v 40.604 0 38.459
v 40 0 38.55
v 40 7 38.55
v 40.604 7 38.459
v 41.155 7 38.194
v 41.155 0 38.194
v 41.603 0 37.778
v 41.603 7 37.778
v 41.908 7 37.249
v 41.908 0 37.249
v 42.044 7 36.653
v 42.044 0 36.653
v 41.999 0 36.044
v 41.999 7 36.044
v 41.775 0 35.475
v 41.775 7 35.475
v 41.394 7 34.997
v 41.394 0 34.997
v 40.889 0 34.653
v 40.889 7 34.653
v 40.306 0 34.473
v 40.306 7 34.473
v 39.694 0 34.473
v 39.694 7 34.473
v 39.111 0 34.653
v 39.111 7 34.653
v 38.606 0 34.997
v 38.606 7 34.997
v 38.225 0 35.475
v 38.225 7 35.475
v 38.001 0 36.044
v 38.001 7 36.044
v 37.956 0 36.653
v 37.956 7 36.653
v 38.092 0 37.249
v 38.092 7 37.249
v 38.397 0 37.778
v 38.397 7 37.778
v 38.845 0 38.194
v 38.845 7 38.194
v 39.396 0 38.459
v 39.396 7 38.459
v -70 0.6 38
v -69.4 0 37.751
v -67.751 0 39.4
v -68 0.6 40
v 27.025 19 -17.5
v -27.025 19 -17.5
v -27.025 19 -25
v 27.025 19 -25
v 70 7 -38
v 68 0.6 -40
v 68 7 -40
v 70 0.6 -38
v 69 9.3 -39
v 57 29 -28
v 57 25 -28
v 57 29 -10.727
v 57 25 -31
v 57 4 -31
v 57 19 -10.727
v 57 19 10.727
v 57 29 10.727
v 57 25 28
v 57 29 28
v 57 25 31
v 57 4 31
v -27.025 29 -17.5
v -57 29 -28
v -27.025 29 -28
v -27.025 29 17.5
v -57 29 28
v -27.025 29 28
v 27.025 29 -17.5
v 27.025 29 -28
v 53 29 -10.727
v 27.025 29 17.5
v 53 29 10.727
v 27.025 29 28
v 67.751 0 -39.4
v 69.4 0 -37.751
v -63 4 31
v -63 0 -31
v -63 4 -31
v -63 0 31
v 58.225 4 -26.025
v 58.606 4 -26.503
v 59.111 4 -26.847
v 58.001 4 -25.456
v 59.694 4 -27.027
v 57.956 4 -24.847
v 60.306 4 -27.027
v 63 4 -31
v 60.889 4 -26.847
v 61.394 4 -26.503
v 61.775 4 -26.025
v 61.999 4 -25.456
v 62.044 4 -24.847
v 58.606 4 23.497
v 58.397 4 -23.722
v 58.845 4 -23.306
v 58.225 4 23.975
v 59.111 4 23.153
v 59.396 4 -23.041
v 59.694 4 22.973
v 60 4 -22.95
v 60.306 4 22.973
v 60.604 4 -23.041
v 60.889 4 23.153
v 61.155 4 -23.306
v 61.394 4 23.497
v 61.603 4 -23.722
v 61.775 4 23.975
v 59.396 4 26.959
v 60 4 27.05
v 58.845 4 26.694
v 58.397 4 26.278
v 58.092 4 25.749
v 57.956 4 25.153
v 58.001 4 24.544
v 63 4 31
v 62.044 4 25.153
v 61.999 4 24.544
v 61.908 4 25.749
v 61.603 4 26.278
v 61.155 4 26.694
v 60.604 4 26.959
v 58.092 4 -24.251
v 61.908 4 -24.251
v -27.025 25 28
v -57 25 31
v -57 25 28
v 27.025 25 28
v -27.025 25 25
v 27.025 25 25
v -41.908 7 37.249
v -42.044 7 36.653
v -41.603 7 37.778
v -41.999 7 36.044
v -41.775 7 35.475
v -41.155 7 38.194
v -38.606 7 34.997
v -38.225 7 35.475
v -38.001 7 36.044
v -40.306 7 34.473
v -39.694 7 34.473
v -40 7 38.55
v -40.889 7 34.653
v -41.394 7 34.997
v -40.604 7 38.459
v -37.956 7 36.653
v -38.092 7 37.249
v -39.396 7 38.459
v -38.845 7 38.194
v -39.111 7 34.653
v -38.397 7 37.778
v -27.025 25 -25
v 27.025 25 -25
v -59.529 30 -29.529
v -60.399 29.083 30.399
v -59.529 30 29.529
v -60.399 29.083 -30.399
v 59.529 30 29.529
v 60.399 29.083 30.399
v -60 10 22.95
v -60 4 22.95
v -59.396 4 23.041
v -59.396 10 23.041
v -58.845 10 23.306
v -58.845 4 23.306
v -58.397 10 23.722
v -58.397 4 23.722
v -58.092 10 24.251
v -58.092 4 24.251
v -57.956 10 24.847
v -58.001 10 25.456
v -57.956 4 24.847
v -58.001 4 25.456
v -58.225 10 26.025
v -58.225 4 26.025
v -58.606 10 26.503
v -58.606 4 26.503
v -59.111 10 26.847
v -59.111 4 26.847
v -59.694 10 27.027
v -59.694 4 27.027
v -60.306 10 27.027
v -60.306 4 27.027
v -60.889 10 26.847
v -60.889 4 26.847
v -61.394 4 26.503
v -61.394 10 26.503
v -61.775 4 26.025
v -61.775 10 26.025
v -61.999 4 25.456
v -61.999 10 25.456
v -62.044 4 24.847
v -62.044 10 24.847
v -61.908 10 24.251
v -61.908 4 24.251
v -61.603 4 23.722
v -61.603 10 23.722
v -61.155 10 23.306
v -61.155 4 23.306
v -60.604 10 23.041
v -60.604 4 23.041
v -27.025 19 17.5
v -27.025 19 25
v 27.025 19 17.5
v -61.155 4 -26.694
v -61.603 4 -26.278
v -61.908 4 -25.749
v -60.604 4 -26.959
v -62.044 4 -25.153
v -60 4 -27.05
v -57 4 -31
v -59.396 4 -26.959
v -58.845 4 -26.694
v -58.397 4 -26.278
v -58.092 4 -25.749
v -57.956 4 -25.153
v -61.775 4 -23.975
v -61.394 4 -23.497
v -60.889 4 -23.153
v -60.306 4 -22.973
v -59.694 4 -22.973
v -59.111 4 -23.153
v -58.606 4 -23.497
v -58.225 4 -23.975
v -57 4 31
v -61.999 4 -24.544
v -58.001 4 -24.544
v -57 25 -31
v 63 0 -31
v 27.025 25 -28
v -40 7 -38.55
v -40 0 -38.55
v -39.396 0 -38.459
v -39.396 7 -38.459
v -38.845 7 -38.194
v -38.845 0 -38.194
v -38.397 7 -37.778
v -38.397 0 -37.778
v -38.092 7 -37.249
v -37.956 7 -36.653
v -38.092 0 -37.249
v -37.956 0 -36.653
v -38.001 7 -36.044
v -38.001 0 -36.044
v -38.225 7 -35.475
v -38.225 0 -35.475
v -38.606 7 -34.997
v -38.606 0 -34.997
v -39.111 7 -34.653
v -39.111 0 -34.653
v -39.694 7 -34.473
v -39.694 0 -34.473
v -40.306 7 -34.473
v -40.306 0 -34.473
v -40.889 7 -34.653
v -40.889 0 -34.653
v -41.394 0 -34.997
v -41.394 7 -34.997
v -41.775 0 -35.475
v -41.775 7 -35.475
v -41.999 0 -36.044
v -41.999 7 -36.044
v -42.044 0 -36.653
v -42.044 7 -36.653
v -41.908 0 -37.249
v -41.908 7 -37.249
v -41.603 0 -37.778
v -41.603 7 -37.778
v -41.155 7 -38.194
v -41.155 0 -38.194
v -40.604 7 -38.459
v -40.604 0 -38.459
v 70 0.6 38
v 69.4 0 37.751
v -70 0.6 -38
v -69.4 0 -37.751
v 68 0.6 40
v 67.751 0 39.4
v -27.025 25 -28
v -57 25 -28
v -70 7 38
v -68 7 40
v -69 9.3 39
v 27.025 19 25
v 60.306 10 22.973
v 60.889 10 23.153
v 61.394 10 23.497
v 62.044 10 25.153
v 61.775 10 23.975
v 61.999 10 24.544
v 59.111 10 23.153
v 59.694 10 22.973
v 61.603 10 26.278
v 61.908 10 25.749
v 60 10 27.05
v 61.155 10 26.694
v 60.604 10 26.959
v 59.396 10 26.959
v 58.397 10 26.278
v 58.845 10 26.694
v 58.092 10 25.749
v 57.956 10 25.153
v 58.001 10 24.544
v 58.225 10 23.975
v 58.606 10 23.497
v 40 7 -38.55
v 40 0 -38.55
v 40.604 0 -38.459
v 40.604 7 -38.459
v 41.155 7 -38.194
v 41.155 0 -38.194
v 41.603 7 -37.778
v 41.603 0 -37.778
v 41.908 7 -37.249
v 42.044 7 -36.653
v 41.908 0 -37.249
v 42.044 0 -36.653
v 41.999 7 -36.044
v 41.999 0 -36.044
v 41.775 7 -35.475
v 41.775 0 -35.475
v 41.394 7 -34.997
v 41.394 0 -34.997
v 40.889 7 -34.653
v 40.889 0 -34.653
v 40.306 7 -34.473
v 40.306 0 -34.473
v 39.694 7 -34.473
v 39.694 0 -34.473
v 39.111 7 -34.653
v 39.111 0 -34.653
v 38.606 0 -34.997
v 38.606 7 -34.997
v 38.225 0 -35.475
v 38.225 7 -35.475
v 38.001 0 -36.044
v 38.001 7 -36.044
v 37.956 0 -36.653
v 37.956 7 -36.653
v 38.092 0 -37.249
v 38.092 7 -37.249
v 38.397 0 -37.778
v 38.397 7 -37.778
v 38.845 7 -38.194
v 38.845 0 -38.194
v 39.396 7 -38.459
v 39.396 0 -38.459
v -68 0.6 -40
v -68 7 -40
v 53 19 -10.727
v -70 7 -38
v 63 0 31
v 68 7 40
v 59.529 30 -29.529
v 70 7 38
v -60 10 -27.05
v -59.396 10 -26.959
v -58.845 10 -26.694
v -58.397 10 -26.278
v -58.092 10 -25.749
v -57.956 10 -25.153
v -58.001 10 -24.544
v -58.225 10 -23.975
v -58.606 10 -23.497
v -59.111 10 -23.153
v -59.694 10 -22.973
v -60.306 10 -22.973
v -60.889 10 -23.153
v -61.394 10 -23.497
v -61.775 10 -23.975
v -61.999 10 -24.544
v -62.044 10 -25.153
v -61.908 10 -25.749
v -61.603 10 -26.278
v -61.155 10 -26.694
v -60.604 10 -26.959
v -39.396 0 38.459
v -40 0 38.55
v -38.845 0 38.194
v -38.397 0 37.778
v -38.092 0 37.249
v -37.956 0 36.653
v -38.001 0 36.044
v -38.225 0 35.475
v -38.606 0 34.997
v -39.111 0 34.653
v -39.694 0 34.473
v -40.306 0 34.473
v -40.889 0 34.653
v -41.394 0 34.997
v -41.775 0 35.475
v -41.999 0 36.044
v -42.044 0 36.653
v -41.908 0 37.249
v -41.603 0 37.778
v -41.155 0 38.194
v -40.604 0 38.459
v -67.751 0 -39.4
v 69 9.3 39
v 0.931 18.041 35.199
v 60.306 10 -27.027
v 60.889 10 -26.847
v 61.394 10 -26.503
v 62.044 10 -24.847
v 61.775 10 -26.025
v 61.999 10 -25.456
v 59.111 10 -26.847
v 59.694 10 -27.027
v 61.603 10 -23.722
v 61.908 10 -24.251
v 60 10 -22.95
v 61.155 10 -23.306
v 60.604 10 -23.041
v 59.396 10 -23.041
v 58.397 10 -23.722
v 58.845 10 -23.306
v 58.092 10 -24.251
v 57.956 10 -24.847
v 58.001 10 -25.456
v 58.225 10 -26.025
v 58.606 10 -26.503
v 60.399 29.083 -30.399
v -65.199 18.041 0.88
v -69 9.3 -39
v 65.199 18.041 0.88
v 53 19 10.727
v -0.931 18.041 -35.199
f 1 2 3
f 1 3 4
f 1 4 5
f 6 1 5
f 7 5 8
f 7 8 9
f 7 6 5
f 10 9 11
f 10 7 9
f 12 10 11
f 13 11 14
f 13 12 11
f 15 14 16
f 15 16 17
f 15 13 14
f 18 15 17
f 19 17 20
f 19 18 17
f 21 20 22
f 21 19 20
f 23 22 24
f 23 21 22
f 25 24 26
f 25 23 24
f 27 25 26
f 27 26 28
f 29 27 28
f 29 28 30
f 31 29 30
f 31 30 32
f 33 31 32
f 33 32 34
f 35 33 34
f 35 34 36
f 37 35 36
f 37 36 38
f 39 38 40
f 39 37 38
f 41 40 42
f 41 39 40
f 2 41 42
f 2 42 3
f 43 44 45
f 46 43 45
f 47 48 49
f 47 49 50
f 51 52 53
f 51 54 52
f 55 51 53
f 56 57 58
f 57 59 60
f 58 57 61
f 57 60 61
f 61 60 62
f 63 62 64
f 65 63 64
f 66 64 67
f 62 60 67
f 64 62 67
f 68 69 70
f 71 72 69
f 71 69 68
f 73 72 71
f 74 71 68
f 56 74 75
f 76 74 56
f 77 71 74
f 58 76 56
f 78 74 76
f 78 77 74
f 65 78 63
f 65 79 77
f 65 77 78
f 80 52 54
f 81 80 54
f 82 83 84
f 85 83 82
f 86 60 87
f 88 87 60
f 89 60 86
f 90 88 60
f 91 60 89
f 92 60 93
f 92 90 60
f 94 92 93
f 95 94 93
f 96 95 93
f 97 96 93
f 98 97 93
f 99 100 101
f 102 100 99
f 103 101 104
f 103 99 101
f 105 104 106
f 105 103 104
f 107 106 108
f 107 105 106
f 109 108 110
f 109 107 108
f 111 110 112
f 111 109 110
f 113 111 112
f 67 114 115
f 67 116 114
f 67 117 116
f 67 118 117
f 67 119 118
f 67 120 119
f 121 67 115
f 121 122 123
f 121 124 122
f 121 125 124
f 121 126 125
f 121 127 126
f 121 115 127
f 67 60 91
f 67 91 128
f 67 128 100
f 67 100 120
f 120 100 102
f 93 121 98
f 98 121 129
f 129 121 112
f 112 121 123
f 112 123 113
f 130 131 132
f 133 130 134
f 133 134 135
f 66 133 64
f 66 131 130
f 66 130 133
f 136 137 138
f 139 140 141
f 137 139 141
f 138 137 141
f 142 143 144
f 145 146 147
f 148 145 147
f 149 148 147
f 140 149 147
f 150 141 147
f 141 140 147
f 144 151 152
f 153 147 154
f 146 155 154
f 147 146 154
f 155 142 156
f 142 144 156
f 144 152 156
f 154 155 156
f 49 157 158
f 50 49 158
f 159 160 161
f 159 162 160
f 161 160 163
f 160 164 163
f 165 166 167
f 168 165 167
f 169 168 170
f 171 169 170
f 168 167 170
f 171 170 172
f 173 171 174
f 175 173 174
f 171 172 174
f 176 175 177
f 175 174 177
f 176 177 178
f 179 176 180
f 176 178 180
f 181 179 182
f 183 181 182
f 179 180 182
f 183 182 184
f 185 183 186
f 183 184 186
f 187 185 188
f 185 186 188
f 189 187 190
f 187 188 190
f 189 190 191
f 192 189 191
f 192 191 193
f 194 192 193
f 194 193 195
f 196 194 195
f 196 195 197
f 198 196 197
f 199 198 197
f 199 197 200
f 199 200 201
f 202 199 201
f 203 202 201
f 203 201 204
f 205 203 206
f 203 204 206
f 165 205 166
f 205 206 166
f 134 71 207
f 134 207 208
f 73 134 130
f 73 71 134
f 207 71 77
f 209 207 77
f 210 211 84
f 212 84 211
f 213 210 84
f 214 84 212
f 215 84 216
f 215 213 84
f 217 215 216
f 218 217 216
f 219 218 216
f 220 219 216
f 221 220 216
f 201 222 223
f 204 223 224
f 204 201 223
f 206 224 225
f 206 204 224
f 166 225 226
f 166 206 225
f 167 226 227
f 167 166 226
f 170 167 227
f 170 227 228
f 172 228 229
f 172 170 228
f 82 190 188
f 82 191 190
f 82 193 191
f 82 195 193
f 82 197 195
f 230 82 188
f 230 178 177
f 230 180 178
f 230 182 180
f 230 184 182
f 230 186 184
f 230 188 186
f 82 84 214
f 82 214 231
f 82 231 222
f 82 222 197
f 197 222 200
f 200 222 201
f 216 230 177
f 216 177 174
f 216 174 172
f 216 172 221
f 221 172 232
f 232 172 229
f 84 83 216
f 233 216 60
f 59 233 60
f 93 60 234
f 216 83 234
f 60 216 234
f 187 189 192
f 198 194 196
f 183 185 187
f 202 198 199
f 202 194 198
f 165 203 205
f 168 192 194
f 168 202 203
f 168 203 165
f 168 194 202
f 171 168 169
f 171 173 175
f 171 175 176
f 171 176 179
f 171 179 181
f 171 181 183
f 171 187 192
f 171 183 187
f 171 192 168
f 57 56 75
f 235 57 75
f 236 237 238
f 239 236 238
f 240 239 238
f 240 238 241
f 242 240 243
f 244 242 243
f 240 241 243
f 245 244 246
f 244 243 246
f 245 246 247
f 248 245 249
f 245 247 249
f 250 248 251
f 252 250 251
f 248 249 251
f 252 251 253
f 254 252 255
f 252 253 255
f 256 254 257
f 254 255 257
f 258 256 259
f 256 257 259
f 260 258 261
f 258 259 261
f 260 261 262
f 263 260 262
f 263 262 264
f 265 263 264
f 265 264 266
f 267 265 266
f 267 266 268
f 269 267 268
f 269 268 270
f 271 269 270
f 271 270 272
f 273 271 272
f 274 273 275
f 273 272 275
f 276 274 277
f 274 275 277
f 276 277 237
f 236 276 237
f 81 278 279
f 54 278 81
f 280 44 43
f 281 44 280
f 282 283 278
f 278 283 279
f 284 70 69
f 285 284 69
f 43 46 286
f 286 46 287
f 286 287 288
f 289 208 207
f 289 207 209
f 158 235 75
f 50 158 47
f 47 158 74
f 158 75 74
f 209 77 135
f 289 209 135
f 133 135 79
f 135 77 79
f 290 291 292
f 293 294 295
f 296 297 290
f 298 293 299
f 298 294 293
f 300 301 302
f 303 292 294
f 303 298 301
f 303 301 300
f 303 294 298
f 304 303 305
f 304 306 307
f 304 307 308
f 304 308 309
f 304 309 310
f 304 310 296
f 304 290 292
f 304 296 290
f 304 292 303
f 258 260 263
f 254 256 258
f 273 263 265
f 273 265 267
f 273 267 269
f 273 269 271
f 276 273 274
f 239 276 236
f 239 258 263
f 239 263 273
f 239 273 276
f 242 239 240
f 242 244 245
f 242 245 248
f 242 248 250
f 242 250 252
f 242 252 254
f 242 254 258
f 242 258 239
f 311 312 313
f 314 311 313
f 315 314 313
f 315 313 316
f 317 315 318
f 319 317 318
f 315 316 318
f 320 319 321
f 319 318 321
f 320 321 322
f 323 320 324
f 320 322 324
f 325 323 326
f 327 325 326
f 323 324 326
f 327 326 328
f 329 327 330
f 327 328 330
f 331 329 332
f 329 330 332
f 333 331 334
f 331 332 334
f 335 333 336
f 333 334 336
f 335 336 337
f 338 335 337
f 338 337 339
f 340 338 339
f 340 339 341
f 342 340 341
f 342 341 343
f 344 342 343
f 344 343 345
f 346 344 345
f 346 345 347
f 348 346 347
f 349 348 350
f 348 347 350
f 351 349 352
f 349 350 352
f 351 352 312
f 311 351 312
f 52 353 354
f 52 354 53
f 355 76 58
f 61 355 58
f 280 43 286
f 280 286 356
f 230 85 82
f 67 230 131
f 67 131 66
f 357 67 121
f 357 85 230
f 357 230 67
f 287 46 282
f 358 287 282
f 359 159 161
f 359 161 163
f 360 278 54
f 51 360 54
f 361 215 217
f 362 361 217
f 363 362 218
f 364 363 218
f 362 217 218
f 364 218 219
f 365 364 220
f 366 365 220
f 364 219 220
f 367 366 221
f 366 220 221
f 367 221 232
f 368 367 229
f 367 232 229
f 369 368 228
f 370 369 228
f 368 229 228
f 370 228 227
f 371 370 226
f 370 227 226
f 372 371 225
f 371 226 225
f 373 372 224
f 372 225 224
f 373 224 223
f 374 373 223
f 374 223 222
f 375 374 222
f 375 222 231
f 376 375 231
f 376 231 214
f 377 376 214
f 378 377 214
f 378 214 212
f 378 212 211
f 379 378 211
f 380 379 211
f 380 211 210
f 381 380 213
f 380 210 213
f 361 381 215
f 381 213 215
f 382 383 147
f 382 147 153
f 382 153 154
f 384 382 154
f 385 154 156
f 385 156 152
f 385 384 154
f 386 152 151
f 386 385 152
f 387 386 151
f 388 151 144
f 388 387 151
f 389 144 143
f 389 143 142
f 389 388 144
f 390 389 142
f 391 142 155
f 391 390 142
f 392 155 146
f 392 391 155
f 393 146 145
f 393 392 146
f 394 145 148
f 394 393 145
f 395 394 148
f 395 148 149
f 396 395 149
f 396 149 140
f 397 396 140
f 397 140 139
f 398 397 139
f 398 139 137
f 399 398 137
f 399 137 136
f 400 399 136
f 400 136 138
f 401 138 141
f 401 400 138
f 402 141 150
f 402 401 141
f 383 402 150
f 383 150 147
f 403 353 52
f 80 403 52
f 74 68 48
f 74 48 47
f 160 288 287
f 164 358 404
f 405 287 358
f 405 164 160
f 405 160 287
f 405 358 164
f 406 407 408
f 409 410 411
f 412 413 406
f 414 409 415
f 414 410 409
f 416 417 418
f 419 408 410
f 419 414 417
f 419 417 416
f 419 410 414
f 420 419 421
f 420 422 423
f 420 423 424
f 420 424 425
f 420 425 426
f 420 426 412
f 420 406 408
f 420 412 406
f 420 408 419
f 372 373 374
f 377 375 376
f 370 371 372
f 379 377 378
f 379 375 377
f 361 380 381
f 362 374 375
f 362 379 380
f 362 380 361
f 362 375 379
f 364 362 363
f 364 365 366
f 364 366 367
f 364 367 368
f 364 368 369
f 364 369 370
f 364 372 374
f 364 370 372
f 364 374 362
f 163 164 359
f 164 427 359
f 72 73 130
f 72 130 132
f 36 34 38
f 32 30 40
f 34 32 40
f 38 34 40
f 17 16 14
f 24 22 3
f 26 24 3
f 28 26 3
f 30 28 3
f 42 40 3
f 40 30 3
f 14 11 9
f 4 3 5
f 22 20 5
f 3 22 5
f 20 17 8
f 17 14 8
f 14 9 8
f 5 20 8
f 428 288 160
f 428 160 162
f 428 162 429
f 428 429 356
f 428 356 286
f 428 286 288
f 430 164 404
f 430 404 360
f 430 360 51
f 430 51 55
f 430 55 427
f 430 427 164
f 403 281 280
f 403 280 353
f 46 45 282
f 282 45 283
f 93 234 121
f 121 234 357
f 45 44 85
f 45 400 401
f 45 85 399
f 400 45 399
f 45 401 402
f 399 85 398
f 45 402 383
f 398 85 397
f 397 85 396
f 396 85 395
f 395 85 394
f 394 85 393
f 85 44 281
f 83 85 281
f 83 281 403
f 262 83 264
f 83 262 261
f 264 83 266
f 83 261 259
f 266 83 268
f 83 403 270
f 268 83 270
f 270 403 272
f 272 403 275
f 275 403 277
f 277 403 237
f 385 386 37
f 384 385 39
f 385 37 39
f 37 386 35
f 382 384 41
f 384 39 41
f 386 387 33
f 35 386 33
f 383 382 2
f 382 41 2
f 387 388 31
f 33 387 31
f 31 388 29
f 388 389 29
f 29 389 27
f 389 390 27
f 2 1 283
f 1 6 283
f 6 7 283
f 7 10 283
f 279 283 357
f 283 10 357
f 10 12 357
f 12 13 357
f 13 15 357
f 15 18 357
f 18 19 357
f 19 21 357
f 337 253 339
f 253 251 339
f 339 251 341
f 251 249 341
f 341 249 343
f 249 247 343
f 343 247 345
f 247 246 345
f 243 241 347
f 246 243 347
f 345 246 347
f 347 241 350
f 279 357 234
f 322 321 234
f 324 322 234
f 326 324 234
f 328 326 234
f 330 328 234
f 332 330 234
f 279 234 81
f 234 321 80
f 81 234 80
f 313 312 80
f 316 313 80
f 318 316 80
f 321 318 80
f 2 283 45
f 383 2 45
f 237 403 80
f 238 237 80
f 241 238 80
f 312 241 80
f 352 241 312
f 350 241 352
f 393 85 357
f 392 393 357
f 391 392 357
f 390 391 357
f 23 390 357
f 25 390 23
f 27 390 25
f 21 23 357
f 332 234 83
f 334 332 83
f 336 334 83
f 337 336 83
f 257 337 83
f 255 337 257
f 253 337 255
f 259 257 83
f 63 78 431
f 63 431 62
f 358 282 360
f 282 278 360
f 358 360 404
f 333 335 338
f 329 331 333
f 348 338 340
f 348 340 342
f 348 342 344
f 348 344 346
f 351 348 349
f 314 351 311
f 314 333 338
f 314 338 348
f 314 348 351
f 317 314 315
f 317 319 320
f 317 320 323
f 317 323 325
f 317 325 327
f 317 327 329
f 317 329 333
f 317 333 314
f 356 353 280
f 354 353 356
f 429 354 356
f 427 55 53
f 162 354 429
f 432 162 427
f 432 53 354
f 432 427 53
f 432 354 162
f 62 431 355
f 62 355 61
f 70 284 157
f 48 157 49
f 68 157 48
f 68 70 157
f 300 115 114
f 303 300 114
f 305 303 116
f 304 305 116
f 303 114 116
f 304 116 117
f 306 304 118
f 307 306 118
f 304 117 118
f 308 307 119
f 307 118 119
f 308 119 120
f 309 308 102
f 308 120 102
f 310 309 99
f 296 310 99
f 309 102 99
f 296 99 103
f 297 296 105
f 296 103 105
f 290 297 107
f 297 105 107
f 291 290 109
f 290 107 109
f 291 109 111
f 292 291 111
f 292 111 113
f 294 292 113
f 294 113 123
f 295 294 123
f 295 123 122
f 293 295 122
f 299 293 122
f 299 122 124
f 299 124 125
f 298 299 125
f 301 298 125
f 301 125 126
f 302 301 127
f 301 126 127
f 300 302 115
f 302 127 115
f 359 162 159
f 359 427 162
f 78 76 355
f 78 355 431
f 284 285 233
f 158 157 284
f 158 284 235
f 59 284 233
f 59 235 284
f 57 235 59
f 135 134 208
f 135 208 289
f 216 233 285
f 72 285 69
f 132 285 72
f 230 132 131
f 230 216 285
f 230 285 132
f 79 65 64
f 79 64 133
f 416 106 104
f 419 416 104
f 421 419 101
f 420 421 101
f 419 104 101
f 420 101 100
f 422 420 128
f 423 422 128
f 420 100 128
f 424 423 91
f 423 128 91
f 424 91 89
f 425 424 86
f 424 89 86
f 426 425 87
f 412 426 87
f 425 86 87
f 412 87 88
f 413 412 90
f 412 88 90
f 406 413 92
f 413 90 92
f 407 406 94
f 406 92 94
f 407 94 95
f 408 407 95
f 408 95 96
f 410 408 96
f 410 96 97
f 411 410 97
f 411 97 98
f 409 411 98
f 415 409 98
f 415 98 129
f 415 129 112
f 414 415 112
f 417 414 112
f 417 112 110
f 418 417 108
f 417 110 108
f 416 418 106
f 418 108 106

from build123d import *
from OCP.BRepFilletAPI import BRepFilletAPI_MakeChamfer

# Parameters (mm, degrees)
SKETCH1_W                       = 140
SKETCH1_H                       = 80
BOSS_EXTRUDE1_DEPTH             = 7
SKETCH3_W                       = 140
SKETCH3_H                       = 80
SKETCH2_W                       = 120
SKETCH2_H                       = 60
CHAMFER1_SIZE                   = 2
SKETCH4_R                       = 2.05
CUT_EXTRUDE1_DEPTH              = 7
SKETCH5_W                       = 114
SKETCH5_H                       = 50
CUT_EXTRUDE2_DEPTH              = 29
SKETCH6_W                       = 114
SKETCH6_H                       = 62
CUT_EXTRUDE3_DEPTH              = 25
SKETCH7_W                       = 6
SKETCH7_H                       = 62
CUT_EXTRUDE4_DEPTH              = 4
SKETCH8_R                       = 2.05
CUT_EXTRUDE5_DEPTH              = 6
CHAMFER2_SIZE                   = 1
CHAMFER2_SIZE2                  = 0.471497246
CHAMFER3_SIZE                   = 0.6
SKIZZE1_W                       = 54.050484576
SKIZZE1_H                       = 7.5
SKIZZE1_W_2                     = 4
SKIZZE1_H_2                     = 21.453027382
AUFSATZ_LINEAR_AUSTRAGEN1_DEPTH = 10
SKIZZE3_W                       = 29.974757712
SKIZZE3_H                       = 3
SCHNITT_LINEAR_AUSTRAGEN2_DEPTH = 4


with BuildPart() as part:
    # Sketch1 → Boss-Extrude1 (new body)
    with BuildSketch(Plane(origin=(0, 0, 0), x_dir=(1, 0, 0), z_dir=(0, 1, 0))):
        Rectangle(SKETCH1_W, SKETCH1_H)
    extrude(amount=BOSS_EXTRUDE1_DEPTH)

    # Sketch3 → Loft2 section 0
    with BuildSketch(Plane(origin=(0, 7, 0), x_dir=(1, 0, 0), z_dir=(0, 1, 0))):
        Rectangle(SKETCH3_W, SKETCH3_H)
    # Sketch2 → Loft2 section 1
    with BuildSketch(Plane(origin=(0, 30, 0), x_dir=(1, 0, 0), z_dir=(0, 1, 0))):
        Rectangle(SKETCH2_W, SKETCH2_H)
    loft()

    # Chamfer1
    chamfer1_edges = [part.edges().sort_by_distance(p)[0] for p in [
        (-70, 3.5, 40),
        (70, 3.5, 40),
        (70, 3.5, -40),
        (-70, 3.5, -40),
    ]]
    chamfer(chamfer1_edges, length=CHAMFER1_SIZE)

    # Sketch4 → Cut-Extrude1 (cut)
    with BuildSketch(Plane.XZ):
        with Locations(Location((40, -36.5, 0), (0, 0, 270))):
            Circle(SKETCH4_R)
        with Locations(Location((-40, -36.5, 0), (0, 0, 270))):
            Circle(SKETCH4_R)
    cut_extrude1 = extrude(amount=-CUT_EXTRUDE1_DEPTH, mode=Mode.SUBTRACT)

    # Sketch5 → Cut-Extrude2 (cut)
    with BuildSketch(Plane.XZ):
        Rectangle(SKETCH5_W, SKETCH5_H)
    extrude(amount=-CUT_EXTRUDE2_DEPTH, mode=Mode.SUBTRACT)

    # Mirror1: Cut-Extrude1 across plane
    add(cut_extrude1.mirror(Plane.XY), mode=Mode.SUBTRACT)

    # Sketch6 → Cut-Extrude3 (cut)
    with BuildSketch(Plane.XZ):
        Rectangle(SKETCH6_W, SKETCH6_H)
    extrude(amount=-CUT_EXTRUDE3_DEPTH, mode=Mode.SUBTRACT)

    # Sketch7 → Cut-Extrude4 (cut)
    with BuildSketch(Plane.XZ):
        with Locations((-60, 0)):
            Rectangle(SKETCH7_W, SKETCH7_H)
        with Locations((60, 0)):
            Rectangle(SKETCH7_W, SKETCH7_H)
    extrude(amount=-CUT_EXTRUDE4_DEPTH, mode=Mode.SUBTRACT)

    # Sketch8 → Cut-Extrude5 (cut)
    with BuildSketch(Plane.XZ.offset(-4)):
        with Locations(Location((-60, 25, 0), (0, 0, 270))):
            Circle(SKETCH8_R)
        with Locations(Location((-60, -25, 0), (0, 0, 270))):
            Circle(SKETCH8_R)
        with Locations(Location((60, -25, 0), (0, 0, 90))):
            Circle(SKETCH8_R)
        with Locations(Location((60, 25, 0), (0, 0, 90))):
            Circle(SKETCH8_R)
    extrude(amount=-CUT_EXTRUDE5_DEPTH, mode=Mode.SUBTRACT)

    # Chamfer2: one chamfer whose edges measure the first distance from different faces: ONE call of the kernel's chamfer builder (chamfer() names one face for all edges)
    chamfer2_edges_1 = [part.edges().sort_by_distance(p)[0] for p in [
        (60, 30, 0),
    ]]
    chamfer2_side_1 = [part.faces().sort_by_distance(p)[0] for p in [
        (65.225405922, 17.98156638, 0),
    ]]
    chamfer2_edges_2 = [part.edges().sort_by_distance(p)[0] for p in [
        (0, 30, -30),
    ]]
    chamfer2_side_2 = [part.faces().sort_by_distance(p)[0] for p in [
        (0, 18.221212121, -35.121212121),
    ]]
    chamfer2_edges_3 = [part.edges().sort_by_distance(p)[0] for p in [
        (-60, 30, 0),
    ]]
    chamfer2_side_3 = [part.faces().sort_by_distance(p)[0] for p in [
        (-65.225405922, 17.98156638, 0),
    ]]
    chamfer2_edges_4 = [part.edges().sort_by_distance(p)[0] for p in [
        (0, 30, 30),
    ]]
    chamfer2_side_4 = [part.faces().sort_by_distance(p)[0] for p in [
        (0, 18.221212121, 35.121212121),
    ]]
    chamfer2 = BRepFilletAPI_MakeChamfer(part.part.solid().wrapped)
    for e in chamfer2_edges_1:
        chamfer2.Add(CHAMFER2_SIZE, CHAMFER2_SIZE2, e.wrapped, chamfer2_side_1[0].wrapped)  # the first distance lies on this face
    for e in chamfer2_edges_2:
        chamfer2.Add(CHAMFER2_SIZE, CHAMFER2_SIZE2, e.wrapped, chamfer2_side_2[0].wrapped)  # the first distance lies on this face
    for e in chamfer2_edges_3:
        chamfer2.Add(CHAMFER2_SIZE, CHAMFER2_SIZE2, e.wrapped, chamfer2_side_3[0].wrapped)  # the first distance lies on this face
    for e in chamfer2_edges_4:
        chamfer2.Add(CHAMFER2_SIZE, CHAMFER2_SIZE2, e.wrapped, chamfer2_side_4[0].wrapped)  # the first distance lies on this face
    add(Compound.cast(chamfer2.Shape()), mode=Mode.REPLACE)

    # Chamfer3
    chamfer3_edges = [part.edges().sort_by_distance(p)[0] for p in [
        (0, 0, 40),
        (70, 0, 0),
        (-70, 0, 0),
        (0, 0, -40),
        (-69, 0, -39),
        (69, 0, -39),
        (69, 0, 39),
        (-69, 0, 39),
    ]]
    chamfer(chamfer3_edges, length=CHAMFER3_SIZE)

    # Skizze1 → Aufsatz-Linear austragen1 (add)
    with BuildSketch(Plane.XZ.offset(-29)):
        with Locations((0, -21.25)):
            Rectangle(SKIZZE1_W, SKIZZE1_H)
        with Locations((0, 21.25)):
            Rectangle(SKIZZE1_W, SKIZZE1_H)
        with Locations((55, 0)):
            Rectangle(SKIZZE1_W_2, SKIZZE1_H_2)
    extrude(amount=AUFSATZ_LINEAR_AUSTRAGEN1_DEPTH)

    # Skizze3 → Schnitt-Linear austragen2 (cut)
    with BuildSketch(Plane(origin=(0, 29, 0), x_dir=(-1, 0, 0), z_dir=(0, -1, 0))):
        with Locations((42.012621144, -26.5)):
            Rectangle(SKIZZE3_W, SKIZZE3_H)
        with Locations((-42.012621144, -26.5)):
            Rectangle(SKIZZE3_W, SKIZZE3_H)
        with Locations((42.012621144, 26.5)):
            Rectangle(SKIZZE3_W, SKIZZE3_H)
        with Locations((-42.012621144, 26.5)):
            Rectangle(SKIZZE3_W, SKIZZE3_H)
    extrude(amount=SCHNITT_LINEAR_AUSTRAGEN2_DEPTH, mode=Mode.SUBTRACT)


solid = part.part
